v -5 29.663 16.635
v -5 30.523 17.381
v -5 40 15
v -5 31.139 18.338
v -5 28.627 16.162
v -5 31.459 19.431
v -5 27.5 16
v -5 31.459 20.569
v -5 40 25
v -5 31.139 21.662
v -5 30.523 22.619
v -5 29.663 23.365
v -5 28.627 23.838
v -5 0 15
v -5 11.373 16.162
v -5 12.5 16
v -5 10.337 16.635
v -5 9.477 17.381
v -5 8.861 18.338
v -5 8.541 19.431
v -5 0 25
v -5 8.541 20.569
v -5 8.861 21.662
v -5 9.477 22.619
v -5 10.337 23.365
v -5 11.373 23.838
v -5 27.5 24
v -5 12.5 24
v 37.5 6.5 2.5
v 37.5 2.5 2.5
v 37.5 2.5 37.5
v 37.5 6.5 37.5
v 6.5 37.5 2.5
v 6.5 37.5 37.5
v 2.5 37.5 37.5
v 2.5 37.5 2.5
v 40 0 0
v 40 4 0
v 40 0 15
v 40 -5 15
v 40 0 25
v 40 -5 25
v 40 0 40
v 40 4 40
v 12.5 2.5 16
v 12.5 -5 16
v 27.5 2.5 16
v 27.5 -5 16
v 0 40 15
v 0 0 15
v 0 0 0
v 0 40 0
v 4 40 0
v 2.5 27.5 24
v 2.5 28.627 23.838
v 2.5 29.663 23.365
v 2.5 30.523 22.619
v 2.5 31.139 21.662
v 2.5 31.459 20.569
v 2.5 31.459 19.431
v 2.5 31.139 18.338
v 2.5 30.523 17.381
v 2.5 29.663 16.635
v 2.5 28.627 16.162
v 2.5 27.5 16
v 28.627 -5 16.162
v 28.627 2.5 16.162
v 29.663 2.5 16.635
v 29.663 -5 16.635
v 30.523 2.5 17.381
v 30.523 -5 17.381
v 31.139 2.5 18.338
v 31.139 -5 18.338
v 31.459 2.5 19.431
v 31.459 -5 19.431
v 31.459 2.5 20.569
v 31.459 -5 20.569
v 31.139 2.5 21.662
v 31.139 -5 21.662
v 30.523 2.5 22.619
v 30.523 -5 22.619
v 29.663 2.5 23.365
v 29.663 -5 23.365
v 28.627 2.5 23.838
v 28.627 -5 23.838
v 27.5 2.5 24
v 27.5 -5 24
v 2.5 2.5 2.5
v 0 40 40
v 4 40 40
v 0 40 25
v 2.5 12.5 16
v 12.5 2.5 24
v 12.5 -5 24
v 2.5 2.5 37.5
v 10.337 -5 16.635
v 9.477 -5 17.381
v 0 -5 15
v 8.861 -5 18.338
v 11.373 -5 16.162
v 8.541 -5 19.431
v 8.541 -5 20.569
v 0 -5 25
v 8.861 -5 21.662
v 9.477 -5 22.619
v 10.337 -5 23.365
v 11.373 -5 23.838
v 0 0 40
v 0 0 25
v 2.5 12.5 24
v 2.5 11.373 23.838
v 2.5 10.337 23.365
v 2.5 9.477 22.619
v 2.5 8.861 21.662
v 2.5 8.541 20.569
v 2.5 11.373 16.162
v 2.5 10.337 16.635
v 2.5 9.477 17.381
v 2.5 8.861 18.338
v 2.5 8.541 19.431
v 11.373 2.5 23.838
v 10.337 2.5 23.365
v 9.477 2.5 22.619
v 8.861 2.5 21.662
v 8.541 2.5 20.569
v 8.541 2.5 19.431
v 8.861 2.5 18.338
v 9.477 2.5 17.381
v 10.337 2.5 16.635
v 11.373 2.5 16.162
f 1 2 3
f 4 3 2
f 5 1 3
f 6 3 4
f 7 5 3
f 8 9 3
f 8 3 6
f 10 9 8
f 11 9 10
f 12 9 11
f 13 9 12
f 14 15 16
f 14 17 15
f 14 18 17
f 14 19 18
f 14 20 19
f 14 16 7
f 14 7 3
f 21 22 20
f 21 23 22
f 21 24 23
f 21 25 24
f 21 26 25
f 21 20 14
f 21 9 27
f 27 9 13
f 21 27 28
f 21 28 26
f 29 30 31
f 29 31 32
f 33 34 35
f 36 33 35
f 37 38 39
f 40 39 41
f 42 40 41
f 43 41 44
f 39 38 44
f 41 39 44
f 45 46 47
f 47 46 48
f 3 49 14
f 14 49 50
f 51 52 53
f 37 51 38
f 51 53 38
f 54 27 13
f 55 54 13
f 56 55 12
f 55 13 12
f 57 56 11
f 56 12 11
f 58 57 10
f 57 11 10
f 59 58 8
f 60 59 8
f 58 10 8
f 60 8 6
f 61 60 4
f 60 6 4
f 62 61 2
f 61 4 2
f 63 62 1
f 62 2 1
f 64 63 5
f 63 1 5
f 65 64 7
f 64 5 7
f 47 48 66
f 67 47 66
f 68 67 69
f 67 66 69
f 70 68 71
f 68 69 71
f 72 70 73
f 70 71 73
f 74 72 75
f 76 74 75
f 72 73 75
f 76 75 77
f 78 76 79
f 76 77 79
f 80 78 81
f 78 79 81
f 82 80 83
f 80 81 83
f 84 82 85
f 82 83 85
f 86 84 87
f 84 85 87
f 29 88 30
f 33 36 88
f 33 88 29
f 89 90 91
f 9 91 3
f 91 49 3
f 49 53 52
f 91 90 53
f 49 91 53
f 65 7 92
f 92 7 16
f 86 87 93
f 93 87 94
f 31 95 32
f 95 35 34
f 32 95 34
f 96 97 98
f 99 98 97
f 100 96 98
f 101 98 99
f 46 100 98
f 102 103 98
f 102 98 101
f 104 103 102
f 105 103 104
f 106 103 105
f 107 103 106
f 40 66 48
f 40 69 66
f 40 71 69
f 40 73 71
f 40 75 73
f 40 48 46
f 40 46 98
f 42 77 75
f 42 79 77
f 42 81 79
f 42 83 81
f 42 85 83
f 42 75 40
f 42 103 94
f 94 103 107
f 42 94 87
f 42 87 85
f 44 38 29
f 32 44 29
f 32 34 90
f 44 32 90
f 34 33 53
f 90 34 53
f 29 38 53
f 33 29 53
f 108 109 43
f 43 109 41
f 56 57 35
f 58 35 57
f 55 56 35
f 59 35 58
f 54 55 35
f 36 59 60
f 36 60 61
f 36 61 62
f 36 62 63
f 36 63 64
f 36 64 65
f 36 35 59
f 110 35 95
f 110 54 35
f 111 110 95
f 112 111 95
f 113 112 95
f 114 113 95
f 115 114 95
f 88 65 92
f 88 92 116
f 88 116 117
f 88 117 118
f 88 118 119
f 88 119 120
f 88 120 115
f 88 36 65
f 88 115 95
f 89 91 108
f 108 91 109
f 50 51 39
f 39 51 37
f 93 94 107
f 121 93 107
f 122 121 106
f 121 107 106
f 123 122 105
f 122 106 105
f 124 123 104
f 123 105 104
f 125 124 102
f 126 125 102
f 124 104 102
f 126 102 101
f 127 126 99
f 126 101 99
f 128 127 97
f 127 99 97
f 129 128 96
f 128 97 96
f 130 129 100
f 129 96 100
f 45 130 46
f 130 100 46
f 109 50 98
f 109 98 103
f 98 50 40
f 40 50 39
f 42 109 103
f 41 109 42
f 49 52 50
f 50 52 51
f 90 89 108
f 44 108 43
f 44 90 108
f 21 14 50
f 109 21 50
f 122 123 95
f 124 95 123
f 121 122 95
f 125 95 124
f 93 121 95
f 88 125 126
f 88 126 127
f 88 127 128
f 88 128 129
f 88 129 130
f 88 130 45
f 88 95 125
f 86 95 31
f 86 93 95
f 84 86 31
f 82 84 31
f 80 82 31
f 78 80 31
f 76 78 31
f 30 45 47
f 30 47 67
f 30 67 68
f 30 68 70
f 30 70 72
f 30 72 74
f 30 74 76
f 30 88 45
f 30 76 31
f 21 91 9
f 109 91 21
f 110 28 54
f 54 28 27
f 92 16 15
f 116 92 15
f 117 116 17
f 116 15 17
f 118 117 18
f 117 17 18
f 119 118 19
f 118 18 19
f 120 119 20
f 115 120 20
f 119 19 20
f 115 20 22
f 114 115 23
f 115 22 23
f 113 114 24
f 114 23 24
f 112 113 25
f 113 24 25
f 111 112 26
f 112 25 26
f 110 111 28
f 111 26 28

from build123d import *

# Parameters (mm, degrees)
F1_DEPTH  = 40
F2_T      = -2.5
F3_W      = 40
F3_H      = 10
F4_DEPTH  = 5
F5_W      = 40
F5_H      = 10
F6_DEPTH  = 5
F8_DEPTH  = 45.001
F10_DEPTH = 45.001


with BuildPart() as f1:
    # F0 (on Top) → F1 (new body)
    with BuildSketch(Plane.XY):
        Polygon((4, 40), (0, 40), (0, 0), (40, 0), (40, 4), align=None)
    extrude(amount=F1_DEPTH)

    # F2
    f2_openings = [f1.faces().sort_by_distance(p)[0] for p in [
        (22, 22, 20),
    ]]
    offset(amount=F2_T, openings=f2_openings)

    # F3 (on face) → F4 (join)
    with BuildSketch(Plane(origin=(0, 0, 0), x_dir=(0, -1, 0), z_dir=(-1, 0, 0))):
        with Locations((-20, 20)):
            Rectangle(F3_W, F3_H)
    extrude(amount=F4_DEPTH)

    # F5 (on face) → F6 (join)
    with BuildSketch(Plane.XZ):
        with Locations((20, 20)):
            Rectangle(F5_W, F5_H)
    extrude(amount=F6_DEPTH)

    # F7 (on face) → F8 (cut, through all)
    with BuildSketch(Plane.XZ.offset(5)):
        with BuildLine():
            Line((27.5, 24), (12.5, 24))
            ThreePointArc((12.5, 24), (8.5, 20), (12.5, 16))
            Line((12.5, 16), (27.5, 16))
            ThreePointArc((27.5, 16), (31.5, 20), (27.5, 24))
        make_face()
    extrude(amount=-F8_DEPTH, mode=Mode.SUBTRACT)

    # F9 (on face) → F10 (cut, through all)
    with BuildSketch(Plane(origin=(-5, 0, 0), x_dir=(0, -1, 0), z_dir=(-1, 0, 0))):
        with BuildLine():
            ThreePointArc((-27.5, 24), (-31.5, 20), (-27.5, 16))
            Line((-27.5, 16), (-12.5, 16))
            ThreePointArc((-12.5, 16), (-8.5, 20), (-12.5, 24))
            Line((-12.5, 24), (-27.5, 24))
        make_face()
    extrude(amount=-F10_DEPTH, mode=Mode.SUBTRACT)


solid = f1.part
